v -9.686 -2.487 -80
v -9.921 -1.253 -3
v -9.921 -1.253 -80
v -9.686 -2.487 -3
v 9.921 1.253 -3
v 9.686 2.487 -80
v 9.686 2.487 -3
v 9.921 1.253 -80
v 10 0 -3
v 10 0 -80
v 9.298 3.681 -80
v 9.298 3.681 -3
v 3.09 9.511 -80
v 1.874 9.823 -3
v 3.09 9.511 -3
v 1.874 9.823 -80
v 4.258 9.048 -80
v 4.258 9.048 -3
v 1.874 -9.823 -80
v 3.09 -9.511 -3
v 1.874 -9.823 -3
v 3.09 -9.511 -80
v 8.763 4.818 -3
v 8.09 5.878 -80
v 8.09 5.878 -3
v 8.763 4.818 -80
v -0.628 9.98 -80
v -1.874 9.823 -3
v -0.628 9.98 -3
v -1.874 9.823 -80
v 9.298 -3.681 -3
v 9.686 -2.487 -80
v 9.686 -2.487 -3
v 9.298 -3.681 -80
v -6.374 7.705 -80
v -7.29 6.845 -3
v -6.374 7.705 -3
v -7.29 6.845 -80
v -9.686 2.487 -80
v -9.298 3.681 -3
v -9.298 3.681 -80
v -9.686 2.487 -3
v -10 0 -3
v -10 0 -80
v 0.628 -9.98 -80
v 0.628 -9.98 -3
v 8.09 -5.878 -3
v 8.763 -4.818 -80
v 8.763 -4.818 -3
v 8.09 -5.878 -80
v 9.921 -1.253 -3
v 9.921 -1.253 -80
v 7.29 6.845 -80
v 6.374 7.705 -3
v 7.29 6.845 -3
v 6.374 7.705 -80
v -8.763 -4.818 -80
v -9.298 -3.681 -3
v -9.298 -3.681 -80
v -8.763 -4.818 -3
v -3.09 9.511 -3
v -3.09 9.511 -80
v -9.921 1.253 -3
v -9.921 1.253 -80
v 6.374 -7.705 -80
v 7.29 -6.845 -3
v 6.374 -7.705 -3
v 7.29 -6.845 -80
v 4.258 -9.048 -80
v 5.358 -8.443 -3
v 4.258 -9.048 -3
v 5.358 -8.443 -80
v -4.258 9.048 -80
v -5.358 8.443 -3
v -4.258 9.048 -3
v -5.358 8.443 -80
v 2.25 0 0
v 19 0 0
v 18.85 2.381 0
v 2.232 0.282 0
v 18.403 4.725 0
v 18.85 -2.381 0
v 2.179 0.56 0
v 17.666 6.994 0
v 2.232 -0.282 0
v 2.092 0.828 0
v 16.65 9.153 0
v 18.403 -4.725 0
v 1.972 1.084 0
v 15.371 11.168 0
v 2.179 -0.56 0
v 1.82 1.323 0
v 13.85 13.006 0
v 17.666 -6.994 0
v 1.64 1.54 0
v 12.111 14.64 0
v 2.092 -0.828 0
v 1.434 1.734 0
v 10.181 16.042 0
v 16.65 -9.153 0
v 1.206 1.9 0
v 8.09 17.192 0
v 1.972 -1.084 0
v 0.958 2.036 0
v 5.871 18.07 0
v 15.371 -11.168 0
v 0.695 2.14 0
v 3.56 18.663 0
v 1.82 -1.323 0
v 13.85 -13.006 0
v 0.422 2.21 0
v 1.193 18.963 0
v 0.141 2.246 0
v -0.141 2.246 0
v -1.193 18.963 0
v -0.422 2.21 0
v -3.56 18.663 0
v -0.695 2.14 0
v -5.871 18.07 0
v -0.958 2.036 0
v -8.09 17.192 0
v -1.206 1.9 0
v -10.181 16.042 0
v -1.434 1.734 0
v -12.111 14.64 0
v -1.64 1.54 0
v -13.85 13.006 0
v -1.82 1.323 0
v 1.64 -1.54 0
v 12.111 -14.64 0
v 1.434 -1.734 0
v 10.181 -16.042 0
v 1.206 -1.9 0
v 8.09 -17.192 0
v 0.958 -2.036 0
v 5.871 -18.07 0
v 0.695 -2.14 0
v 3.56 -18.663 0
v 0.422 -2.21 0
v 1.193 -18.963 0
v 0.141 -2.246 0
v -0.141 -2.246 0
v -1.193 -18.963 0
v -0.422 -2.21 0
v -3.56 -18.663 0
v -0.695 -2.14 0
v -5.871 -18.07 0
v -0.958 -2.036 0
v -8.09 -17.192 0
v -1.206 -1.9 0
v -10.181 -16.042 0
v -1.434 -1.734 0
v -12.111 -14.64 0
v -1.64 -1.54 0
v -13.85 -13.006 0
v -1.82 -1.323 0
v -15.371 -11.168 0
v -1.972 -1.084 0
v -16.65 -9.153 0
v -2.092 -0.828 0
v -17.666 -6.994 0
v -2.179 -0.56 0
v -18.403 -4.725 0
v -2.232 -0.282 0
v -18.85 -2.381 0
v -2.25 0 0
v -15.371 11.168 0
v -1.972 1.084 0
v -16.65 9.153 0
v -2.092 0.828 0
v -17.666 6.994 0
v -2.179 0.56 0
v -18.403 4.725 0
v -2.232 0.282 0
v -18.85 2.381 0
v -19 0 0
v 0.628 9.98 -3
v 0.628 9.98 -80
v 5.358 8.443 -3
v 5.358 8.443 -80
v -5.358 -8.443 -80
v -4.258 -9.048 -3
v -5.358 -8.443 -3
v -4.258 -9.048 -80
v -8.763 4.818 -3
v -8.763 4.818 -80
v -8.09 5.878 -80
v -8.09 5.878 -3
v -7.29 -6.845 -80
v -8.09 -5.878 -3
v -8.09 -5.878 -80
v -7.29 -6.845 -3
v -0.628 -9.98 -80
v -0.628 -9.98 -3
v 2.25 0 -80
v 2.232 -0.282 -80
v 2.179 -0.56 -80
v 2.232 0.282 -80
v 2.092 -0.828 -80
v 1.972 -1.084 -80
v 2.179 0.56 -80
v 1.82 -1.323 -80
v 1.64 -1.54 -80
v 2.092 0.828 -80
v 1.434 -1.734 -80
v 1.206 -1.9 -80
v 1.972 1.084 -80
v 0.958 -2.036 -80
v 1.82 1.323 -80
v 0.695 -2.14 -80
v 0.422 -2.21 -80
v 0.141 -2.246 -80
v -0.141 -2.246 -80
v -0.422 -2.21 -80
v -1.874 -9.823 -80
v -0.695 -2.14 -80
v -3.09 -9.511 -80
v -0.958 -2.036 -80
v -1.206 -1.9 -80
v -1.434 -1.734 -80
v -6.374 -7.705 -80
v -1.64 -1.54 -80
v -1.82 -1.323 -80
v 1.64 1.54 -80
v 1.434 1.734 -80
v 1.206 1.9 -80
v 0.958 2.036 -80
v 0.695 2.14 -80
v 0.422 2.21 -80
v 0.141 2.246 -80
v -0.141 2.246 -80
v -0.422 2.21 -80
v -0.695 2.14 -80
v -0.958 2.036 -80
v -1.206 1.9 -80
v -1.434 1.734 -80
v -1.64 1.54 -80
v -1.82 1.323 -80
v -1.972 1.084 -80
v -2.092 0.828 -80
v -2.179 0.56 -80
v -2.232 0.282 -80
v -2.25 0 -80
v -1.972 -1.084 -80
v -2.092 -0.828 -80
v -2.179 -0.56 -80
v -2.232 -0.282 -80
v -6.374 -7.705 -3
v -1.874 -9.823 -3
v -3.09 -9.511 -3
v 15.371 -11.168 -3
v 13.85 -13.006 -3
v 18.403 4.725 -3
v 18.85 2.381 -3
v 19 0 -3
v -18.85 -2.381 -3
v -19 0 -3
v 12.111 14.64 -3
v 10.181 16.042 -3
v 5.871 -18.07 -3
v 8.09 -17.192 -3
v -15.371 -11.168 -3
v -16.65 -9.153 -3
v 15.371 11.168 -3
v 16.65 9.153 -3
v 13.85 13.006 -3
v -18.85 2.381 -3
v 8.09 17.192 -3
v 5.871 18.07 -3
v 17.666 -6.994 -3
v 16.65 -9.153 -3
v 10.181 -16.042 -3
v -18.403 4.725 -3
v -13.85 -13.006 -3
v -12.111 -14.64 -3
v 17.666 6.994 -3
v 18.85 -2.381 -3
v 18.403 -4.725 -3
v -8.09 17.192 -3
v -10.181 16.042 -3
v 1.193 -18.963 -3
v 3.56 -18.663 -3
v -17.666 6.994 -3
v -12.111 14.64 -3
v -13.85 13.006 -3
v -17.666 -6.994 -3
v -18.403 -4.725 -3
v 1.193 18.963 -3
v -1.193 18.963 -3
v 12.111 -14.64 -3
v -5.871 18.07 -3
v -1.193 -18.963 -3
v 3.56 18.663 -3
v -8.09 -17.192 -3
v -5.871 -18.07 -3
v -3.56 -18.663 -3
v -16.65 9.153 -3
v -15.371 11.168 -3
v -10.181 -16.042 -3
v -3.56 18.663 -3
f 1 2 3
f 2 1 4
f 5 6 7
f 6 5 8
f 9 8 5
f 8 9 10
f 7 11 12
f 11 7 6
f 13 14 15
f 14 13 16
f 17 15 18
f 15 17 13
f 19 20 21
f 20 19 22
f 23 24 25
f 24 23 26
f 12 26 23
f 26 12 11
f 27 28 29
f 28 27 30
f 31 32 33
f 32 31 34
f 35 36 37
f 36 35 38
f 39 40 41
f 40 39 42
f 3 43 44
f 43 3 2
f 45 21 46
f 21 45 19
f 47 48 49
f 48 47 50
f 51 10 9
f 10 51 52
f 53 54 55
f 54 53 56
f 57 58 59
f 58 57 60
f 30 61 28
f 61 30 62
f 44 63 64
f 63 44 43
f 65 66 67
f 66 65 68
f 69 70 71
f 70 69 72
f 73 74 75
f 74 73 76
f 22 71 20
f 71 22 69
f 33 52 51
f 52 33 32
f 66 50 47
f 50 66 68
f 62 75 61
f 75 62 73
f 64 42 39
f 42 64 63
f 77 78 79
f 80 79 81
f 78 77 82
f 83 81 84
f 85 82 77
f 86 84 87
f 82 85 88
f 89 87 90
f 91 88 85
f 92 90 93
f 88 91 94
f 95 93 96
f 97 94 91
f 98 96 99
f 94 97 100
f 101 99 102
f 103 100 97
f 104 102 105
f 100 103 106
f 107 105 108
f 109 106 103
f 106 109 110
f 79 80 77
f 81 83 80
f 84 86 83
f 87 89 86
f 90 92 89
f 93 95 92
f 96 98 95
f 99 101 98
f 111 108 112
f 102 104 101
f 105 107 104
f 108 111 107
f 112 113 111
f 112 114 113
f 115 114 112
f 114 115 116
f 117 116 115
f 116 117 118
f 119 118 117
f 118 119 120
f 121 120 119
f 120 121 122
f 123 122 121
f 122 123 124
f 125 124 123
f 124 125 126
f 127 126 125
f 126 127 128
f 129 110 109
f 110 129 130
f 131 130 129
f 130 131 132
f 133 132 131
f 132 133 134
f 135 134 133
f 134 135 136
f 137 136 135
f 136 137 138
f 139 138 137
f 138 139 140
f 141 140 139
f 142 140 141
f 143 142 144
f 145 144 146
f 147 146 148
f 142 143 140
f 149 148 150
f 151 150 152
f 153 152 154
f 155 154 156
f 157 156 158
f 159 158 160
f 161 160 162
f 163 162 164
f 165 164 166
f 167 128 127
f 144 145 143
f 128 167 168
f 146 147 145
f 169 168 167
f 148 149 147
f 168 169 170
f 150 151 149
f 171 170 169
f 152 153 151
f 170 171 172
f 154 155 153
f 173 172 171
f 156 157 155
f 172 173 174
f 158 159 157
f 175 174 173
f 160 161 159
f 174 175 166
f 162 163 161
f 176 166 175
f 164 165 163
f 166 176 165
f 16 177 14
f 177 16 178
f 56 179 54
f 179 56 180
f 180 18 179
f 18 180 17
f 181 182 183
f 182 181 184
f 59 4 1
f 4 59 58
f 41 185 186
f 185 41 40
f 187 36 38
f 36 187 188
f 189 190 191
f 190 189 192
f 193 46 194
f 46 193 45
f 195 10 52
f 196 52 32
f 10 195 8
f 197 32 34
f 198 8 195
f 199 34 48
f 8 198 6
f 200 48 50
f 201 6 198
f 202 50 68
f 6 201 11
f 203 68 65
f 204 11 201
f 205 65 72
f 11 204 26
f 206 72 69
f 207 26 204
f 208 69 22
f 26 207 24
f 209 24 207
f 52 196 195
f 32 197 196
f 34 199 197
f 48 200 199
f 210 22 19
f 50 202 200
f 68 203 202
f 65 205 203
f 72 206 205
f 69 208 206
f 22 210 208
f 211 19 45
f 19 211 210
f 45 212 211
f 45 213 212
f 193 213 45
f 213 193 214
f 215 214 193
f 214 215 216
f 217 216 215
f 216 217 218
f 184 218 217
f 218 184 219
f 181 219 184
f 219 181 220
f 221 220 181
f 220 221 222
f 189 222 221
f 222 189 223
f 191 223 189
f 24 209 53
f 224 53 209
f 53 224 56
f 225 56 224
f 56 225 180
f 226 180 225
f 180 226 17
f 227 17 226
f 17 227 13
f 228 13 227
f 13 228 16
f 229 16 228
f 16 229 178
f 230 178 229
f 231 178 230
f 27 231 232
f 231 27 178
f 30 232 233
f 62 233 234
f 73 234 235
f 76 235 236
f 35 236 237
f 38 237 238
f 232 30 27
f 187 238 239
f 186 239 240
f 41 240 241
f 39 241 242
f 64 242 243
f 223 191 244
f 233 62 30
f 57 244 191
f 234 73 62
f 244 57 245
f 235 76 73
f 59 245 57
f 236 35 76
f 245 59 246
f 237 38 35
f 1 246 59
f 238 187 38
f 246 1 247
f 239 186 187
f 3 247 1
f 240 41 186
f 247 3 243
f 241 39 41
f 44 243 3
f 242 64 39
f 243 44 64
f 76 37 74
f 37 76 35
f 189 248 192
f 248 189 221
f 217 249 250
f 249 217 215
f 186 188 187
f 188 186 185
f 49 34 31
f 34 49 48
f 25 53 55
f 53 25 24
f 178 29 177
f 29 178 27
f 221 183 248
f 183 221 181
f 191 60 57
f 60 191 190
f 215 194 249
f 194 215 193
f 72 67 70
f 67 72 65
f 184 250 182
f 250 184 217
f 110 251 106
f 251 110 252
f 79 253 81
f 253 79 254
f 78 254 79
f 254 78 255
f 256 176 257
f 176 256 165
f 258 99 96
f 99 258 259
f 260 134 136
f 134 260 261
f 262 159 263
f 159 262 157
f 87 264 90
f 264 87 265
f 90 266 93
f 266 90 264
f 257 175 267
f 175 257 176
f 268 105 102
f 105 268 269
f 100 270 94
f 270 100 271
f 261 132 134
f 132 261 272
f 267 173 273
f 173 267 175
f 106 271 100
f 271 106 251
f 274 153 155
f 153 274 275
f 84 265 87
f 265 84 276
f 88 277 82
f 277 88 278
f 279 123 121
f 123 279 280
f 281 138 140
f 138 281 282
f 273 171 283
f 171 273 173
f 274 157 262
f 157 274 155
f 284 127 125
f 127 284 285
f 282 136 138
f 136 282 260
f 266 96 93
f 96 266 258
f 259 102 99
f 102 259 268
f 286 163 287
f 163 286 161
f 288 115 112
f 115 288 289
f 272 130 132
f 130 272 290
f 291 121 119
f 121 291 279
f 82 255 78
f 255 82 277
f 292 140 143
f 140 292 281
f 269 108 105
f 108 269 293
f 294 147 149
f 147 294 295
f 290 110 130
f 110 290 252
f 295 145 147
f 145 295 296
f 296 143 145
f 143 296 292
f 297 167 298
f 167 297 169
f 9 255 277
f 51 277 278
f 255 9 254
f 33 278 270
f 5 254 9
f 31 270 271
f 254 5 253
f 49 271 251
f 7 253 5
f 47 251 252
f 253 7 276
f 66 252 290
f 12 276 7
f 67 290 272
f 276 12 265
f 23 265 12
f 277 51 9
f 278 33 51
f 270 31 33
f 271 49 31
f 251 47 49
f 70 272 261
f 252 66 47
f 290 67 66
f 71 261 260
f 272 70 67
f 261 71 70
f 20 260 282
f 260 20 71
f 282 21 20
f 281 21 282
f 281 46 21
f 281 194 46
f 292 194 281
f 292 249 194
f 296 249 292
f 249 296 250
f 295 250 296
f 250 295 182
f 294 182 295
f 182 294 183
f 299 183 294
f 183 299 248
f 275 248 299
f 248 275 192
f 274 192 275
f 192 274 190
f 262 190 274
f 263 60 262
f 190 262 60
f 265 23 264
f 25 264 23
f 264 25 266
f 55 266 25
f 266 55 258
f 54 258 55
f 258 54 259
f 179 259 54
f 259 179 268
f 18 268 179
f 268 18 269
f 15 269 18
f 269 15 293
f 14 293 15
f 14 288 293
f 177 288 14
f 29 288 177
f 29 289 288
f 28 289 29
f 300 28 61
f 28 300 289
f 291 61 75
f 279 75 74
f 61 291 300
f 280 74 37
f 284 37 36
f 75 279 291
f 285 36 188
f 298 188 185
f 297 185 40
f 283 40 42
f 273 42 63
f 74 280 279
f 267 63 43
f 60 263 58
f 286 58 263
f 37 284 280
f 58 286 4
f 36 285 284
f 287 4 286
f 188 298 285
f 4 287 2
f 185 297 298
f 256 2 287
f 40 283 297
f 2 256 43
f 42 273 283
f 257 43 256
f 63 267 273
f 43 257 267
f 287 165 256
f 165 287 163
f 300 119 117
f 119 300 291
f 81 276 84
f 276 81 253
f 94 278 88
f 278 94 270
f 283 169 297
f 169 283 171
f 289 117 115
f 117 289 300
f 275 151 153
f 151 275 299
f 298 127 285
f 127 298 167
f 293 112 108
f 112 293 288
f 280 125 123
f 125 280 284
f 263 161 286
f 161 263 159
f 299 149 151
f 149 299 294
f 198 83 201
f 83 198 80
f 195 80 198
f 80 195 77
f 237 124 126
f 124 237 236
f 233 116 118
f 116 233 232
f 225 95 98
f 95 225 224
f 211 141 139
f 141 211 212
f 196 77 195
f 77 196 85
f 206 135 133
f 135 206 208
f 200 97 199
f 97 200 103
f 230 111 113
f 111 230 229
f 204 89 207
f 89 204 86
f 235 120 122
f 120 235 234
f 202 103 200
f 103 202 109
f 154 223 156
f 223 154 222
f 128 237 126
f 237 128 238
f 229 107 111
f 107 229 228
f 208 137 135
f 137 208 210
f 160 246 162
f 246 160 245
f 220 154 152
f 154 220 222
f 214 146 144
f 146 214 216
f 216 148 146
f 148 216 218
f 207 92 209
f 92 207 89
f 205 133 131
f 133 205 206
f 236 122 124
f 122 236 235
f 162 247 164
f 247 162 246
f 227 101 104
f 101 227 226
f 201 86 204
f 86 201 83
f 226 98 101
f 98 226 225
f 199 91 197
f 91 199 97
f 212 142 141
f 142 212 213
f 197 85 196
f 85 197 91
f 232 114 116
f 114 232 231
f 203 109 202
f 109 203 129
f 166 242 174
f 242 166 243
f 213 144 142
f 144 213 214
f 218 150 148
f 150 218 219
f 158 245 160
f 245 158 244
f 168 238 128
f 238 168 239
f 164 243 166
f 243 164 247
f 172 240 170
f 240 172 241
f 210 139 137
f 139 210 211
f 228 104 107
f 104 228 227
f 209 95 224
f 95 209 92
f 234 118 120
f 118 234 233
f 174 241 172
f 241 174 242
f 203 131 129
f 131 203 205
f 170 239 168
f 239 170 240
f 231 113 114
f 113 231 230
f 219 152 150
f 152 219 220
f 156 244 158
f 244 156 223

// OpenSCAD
$fn = 50;


difference() {
	union() {
		translate(v = [0, 0, -80.0000000000]) {
			cylinder(h = 80, r = 10.0000000000);
		}
		translate(v = [0, 0, -3.0000000000]) {
			cylinder(h = 3, r = 19.0000000000);
		}
	}
	union() {
		#translate(v = [0, 0, -80]) {
			cylinder(h = 80, r = 2.2500000000);
		}
	}
}
